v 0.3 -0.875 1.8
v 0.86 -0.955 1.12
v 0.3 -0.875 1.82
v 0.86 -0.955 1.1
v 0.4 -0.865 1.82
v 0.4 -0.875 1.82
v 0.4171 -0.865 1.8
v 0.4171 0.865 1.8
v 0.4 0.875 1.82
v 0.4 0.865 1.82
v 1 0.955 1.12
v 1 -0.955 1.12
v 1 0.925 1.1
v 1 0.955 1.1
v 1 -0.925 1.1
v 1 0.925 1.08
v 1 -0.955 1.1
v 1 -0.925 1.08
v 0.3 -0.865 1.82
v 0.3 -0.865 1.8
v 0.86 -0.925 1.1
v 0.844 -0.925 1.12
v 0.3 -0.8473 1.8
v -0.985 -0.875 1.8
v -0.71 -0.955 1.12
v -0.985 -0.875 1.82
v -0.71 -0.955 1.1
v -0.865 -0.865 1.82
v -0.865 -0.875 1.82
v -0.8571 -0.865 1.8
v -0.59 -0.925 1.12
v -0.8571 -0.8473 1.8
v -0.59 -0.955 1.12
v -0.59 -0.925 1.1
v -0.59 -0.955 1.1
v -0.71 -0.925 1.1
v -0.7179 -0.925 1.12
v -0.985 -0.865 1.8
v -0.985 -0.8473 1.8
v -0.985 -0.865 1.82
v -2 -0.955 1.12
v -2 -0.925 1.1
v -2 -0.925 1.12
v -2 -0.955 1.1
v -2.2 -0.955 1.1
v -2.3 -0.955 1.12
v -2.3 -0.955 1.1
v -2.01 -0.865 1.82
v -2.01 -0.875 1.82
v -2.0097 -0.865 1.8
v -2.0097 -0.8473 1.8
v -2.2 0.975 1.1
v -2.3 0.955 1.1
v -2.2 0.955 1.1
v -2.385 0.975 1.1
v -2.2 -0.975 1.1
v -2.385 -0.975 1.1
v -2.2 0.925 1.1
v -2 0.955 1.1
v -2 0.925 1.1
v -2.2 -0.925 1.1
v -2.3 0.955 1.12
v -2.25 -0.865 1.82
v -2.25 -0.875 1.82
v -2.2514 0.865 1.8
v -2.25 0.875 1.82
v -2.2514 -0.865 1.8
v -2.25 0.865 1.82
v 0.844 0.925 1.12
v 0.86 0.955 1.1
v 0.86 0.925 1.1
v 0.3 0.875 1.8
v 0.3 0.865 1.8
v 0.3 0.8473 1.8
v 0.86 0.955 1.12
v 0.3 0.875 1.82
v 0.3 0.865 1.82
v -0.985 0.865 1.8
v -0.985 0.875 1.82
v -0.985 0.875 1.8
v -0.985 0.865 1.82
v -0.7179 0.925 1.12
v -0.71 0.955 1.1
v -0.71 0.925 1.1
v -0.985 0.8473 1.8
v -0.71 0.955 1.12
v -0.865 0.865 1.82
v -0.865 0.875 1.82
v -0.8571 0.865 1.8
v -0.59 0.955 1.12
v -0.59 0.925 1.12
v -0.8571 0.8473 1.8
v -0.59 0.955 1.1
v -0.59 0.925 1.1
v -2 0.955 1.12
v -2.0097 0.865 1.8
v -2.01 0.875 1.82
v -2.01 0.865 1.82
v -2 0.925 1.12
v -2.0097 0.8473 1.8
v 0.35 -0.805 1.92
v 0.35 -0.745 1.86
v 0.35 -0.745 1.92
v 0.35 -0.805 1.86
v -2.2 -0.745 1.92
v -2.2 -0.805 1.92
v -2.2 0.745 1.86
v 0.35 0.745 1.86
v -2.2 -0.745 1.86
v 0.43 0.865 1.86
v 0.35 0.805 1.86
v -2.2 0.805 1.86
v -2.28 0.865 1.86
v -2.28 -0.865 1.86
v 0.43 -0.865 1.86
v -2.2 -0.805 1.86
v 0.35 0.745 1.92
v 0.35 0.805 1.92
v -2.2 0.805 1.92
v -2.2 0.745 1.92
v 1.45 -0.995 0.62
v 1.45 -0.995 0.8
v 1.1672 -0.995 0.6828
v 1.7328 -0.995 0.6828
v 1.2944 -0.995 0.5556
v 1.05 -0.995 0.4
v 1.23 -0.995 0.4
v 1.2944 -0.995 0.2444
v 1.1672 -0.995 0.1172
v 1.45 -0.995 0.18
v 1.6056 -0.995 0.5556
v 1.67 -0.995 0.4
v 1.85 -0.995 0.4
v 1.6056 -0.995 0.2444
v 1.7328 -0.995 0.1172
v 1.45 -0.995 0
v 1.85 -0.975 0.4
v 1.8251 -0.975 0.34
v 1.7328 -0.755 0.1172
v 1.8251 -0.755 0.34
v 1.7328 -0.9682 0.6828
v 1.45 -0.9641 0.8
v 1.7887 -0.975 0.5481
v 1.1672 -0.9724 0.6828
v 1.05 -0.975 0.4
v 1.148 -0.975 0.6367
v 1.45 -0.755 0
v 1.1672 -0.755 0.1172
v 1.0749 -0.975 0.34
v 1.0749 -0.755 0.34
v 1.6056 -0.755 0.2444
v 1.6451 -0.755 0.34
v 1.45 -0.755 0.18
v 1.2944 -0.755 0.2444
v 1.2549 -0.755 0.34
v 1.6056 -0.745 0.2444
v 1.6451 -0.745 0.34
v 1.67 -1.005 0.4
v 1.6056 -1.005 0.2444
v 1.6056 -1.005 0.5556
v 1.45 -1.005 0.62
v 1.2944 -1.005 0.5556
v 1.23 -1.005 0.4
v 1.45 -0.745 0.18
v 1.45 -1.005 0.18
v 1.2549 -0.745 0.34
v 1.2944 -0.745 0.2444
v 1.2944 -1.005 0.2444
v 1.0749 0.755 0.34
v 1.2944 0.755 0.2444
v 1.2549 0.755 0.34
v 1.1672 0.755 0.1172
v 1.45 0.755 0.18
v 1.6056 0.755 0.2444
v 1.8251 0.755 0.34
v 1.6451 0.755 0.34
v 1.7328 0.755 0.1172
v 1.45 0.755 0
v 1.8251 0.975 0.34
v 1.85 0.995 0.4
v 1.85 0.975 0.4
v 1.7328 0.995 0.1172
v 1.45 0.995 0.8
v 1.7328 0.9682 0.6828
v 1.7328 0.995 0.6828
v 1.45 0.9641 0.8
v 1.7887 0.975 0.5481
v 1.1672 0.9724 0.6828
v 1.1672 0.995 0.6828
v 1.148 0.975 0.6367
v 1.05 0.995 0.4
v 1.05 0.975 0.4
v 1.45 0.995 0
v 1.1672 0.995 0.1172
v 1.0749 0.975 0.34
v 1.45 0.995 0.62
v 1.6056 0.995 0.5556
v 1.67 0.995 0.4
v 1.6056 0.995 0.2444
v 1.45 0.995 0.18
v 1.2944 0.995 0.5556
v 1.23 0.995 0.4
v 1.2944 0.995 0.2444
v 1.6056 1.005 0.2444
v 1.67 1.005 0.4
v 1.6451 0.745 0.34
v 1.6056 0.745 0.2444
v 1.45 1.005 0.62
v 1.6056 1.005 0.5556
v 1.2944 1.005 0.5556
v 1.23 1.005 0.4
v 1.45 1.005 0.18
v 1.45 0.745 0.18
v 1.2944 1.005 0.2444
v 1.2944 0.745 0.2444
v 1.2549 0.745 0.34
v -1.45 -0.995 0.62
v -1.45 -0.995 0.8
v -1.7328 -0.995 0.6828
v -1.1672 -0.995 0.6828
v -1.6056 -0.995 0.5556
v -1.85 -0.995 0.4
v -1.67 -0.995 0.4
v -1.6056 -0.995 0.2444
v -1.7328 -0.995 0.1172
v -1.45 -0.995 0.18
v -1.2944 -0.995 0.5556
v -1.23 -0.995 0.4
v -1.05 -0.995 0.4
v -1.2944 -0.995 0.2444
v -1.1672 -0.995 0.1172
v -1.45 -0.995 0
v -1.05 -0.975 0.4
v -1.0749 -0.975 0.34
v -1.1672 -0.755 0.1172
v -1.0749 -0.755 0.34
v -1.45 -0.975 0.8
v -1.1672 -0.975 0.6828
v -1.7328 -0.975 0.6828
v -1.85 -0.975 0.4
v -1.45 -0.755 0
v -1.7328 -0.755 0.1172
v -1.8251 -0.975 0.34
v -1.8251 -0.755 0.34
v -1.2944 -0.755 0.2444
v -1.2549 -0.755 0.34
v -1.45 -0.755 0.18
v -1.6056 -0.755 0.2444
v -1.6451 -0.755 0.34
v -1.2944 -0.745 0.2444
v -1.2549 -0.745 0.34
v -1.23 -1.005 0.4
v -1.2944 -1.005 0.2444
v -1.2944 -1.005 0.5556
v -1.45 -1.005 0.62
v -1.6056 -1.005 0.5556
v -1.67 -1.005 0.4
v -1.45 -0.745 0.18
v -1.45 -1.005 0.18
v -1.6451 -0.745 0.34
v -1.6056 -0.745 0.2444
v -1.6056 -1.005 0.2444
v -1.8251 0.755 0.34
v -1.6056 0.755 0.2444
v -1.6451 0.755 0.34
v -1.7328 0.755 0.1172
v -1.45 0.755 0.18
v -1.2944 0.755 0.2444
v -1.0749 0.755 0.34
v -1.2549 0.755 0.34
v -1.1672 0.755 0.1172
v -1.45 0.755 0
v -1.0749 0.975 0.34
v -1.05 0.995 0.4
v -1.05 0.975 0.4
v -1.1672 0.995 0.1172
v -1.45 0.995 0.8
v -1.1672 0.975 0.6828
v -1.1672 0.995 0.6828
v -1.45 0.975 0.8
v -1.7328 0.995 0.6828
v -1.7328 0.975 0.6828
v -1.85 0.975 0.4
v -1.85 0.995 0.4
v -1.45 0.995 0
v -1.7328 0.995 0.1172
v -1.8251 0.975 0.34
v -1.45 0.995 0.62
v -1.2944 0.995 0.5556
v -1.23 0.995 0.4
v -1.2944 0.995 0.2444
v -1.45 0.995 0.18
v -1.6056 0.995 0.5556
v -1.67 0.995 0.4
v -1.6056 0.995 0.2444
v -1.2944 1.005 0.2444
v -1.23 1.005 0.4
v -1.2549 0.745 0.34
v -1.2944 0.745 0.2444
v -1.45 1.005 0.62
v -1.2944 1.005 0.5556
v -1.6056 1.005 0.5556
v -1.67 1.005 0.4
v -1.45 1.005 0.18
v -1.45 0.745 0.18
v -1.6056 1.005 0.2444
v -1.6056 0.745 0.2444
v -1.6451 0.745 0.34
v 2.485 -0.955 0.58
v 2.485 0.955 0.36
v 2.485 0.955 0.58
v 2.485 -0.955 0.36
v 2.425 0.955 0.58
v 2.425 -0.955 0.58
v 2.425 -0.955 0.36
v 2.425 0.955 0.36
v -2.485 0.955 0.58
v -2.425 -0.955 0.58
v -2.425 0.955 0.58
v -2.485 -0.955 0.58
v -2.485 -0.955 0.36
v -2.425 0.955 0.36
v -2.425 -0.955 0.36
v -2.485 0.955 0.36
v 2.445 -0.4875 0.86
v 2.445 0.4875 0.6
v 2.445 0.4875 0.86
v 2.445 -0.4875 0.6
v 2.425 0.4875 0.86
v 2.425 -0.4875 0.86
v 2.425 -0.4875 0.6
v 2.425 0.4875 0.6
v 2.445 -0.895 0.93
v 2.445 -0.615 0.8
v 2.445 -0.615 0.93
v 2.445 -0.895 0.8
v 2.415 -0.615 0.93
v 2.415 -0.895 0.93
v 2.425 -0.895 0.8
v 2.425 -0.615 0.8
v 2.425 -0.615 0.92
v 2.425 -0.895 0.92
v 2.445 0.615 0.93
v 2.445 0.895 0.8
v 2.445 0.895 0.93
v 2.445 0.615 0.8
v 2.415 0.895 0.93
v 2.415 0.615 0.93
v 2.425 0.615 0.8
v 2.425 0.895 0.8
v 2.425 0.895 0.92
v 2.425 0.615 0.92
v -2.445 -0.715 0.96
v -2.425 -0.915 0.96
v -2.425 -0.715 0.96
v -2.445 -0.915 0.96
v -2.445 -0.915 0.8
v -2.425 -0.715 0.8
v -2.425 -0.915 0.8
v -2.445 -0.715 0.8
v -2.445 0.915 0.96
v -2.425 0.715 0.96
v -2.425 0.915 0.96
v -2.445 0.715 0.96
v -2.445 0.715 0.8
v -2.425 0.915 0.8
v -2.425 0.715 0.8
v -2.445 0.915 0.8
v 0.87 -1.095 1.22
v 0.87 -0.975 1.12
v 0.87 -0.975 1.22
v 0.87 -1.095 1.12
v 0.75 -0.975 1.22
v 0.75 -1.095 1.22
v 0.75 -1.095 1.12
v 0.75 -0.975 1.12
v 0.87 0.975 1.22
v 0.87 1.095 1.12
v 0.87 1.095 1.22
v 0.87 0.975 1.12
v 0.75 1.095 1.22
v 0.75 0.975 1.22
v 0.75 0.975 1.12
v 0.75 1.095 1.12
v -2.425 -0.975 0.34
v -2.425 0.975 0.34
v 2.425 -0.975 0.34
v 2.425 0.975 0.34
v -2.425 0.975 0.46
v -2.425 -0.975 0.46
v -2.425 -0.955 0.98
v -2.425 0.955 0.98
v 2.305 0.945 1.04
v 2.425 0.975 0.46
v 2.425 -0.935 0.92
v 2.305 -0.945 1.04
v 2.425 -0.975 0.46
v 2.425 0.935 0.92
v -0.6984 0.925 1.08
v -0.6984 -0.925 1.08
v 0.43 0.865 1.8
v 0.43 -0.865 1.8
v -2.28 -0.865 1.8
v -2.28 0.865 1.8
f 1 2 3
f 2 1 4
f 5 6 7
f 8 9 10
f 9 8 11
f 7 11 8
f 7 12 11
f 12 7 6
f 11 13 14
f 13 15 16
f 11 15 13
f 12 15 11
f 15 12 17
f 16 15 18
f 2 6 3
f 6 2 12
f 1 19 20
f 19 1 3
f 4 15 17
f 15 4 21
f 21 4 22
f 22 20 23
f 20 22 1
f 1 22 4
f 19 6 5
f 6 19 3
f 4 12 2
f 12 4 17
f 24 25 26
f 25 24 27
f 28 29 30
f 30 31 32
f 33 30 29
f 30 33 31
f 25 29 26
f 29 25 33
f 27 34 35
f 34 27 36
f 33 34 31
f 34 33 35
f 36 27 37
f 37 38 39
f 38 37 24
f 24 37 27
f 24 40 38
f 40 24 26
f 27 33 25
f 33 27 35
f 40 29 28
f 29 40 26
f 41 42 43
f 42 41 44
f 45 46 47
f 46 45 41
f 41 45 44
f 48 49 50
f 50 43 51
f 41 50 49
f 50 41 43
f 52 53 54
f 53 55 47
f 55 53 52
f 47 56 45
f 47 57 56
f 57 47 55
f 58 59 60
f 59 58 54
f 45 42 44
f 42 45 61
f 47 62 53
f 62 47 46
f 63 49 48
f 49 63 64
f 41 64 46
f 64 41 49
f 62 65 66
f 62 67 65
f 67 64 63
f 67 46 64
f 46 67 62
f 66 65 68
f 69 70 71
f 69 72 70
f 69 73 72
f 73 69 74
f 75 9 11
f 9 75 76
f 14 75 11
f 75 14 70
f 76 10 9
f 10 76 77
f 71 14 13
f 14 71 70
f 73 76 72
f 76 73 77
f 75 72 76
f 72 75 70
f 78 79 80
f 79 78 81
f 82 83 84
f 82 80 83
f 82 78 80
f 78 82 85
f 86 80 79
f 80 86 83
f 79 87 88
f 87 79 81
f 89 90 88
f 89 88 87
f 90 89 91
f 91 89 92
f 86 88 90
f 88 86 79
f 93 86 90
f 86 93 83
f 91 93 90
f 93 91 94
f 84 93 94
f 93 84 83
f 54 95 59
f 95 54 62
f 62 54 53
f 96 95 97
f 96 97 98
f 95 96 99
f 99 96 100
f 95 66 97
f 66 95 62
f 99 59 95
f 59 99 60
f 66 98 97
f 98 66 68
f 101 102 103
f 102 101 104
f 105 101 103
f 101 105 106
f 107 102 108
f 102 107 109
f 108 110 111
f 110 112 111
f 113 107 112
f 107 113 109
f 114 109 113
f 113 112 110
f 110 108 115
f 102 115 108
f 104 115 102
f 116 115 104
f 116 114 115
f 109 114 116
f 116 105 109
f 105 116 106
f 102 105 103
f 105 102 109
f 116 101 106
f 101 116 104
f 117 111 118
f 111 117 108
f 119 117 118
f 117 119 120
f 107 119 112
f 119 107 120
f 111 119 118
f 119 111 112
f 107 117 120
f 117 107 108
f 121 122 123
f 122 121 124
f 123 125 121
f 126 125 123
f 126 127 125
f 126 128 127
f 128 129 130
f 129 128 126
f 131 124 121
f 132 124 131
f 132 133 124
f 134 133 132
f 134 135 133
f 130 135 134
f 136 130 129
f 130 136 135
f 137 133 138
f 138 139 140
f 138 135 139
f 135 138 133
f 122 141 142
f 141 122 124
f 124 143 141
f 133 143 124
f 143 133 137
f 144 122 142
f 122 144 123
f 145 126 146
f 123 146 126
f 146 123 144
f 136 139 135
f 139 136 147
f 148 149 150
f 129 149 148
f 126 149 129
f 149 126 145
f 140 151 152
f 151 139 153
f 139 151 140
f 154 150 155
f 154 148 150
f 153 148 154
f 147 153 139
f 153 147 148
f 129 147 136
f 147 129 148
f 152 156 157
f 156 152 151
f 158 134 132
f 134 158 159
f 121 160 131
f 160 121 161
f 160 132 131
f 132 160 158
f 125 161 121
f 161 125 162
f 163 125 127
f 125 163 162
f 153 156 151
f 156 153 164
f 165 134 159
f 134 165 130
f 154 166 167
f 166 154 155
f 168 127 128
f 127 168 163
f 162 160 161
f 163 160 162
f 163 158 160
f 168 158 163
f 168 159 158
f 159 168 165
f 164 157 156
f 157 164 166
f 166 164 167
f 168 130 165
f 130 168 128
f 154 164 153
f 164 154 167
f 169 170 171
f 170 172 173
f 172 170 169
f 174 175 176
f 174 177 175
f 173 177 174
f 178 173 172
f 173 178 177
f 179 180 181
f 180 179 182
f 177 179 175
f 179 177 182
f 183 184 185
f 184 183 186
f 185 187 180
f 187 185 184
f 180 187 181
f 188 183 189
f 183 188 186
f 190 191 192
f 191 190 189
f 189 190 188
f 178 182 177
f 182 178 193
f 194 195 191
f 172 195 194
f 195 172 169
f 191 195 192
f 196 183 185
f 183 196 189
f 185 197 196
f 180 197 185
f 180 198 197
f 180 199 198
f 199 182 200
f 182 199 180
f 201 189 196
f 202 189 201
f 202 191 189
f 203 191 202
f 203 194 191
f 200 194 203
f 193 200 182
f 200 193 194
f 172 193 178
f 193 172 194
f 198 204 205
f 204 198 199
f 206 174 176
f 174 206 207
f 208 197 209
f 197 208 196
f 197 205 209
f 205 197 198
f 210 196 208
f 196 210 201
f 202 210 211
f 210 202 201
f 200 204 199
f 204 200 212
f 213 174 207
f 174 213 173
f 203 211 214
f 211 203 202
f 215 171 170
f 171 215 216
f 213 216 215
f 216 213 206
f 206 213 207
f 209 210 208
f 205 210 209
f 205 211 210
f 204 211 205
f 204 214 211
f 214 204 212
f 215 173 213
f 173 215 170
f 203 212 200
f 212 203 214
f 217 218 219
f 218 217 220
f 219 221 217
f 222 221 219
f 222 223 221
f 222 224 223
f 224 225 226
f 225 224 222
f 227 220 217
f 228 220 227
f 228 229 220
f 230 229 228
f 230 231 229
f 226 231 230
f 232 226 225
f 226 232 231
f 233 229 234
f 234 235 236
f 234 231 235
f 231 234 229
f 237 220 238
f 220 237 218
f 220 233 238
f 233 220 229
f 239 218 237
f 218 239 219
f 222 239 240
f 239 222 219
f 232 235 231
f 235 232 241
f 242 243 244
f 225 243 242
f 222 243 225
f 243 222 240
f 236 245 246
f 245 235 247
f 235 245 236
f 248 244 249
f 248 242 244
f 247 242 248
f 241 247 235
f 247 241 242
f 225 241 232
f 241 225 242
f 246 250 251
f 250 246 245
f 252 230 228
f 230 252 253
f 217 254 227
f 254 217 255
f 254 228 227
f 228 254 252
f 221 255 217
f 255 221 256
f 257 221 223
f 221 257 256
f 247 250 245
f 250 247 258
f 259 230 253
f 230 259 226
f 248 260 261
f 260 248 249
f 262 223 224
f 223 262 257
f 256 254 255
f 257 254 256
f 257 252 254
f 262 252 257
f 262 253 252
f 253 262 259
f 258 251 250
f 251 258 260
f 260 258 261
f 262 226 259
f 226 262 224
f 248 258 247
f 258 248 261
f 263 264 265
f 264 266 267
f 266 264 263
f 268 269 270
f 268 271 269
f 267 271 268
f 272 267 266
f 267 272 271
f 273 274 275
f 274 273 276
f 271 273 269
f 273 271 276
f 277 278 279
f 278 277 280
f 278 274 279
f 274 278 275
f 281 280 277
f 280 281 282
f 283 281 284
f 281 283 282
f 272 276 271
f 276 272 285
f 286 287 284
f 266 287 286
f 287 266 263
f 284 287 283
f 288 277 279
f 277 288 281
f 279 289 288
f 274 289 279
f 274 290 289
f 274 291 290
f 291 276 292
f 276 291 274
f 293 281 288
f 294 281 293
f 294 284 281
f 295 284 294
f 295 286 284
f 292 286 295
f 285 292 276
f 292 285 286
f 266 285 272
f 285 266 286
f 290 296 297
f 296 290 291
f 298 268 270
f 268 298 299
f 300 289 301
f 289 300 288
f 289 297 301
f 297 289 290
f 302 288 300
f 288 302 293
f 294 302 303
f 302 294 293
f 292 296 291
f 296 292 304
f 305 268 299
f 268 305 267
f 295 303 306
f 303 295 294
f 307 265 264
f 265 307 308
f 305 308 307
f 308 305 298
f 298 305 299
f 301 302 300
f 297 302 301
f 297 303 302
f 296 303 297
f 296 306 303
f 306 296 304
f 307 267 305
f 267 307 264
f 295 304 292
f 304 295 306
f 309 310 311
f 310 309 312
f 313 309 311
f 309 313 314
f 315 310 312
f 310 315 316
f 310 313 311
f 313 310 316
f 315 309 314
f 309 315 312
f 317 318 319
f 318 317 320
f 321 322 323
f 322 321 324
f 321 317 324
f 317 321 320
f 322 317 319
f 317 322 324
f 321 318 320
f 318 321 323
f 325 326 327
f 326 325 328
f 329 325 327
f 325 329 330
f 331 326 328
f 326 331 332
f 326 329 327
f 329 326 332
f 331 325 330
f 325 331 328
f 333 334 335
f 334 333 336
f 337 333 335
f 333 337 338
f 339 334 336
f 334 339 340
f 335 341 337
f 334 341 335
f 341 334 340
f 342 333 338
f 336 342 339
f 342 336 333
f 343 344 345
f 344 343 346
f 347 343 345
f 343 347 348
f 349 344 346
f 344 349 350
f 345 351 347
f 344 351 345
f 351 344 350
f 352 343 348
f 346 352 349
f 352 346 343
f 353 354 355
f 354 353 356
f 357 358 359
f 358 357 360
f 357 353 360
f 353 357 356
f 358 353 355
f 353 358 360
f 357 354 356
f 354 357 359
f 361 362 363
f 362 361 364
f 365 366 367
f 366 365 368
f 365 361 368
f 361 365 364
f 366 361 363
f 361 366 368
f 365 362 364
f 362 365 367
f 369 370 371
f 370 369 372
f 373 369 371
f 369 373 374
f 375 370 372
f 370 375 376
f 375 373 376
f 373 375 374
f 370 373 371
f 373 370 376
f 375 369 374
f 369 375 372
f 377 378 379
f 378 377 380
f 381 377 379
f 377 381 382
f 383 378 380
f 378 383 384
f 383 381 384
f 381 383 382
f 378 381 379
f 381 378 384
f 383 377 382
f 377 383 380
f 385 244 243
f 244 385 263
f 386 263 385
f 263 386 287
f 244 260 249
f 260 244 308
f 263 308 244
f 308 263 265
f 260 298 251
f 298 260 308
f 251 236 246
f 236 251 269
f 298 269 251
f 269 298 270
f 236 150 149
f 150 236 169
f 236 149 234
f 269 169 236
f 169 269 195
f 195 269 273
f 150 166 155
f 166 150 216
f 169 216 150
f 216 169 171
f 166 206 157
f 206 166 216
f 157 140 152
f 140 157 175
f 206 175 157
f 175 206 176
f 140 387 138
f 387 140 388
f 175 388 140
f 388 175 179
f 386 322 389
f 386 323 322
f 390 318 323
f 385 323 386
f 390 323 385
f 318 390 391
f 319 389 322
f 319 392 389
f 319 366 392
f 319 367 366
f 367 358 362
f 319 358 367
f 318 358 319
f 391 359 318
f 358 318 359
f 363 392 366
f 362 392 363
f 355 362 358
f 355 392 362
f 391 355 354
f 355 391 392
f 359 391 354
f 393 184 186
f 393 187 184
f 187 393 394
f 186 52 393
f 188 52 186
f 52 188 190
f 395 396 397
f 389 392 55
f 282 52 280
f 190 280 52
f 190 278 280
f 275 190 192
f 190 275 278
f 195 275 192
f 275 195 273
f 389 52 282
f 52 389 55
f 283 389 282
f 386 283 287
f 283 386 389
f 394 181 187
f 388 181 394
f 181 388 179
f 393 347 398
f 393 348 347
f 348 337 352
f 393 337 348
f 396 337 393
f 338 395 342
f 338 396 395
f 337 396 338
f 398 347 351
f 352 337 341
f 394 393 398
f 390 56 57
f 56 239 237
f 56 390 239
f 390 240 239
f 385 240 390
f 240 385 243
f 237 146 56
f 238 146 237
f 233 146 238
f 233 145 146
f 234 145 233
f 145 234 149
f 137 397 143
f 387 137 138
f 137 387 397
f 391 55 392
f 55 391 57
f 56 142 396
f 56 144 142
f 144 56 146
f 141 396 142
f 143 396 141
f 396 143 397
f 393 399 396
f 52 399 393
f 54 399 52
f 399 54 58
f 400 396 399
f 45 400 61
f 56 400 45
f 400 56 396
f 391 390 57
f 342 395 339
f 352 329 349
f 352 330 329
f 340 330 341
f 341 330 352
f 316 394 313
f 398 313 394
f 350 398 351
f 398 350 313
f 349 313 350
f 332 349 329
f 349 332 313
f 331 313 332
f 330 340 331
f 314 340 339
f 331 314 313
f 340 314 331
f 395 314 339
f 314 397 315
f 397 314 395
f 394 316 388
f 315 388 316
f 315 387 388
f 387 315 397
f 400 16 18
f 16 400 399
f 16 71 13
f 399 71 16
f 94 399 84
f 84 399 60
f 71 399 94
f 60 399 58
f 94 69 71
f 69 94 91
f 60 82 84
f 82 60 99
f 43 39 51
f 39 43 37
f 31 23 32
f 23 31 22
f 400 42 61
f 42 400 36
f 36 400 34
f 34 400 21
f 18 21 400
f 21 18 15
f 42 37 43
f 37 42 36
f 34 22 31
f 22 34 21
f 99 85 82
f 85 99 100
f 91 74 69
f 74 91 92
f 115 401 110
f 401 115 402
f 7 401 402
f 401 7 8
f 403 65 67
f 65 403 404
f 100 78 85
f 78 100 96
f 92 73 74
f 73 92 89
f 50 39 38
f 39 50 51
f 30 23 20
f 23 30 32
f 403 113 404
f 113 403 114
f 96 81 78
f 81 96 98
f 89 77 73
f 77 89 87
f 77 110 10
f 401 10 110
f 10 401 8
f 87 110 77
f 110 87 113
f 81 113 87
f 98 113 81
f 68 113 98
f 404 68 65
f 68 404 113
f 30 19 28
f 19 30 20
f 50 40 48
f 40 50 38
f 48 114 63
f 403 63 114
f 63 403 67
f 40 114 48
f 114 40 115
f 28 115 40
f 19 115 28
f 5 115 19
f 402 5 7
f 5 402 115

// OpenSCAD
// file: lib/car_kit.scad
// Car kit — the parts every road vehicle shares (car_sedan.scad,
// car_minisuv.scad, car_suv.scad, car_jeep.scad, car_van.scad), which
// differ in their proportions. world.CarKind names them; the renderer
// draws each kind from its own mesh, tinted per car, with a roof rack or
// box (car_roof_rack.scad, car_roof_box.scad) set on the roof at the
// height in render.carRoofs.
//
//   +X = forward (the car's front faces +X)
//   +Y = lateral (driver's left when facing +X)
//   +Z = up
//
// The paint is near white so the per-car tint is the paint colour;
// glass, tyres, trim and lights are dark or bright enough to read
// through any tint.
//
// Conventions, units, and axis docs: see models-src/README.md.

$fn = 8;

paint  = [0.92, 0.92, 0.92];
glass  = [0.30, 0.40, 0.50];
trim   = [0.16, 0.16, 0.17]; // bumpers, grille, rails, mirrors
tyre   = [0.08, 0.08, 0.08];
hubcap = [0.55, 0.56, 0.58];
lamp   = [1.00, 0.96, 0.82];
tail   = [0.80, 0.12, 0.10];

// slab is a thin box from x0 to x1, centred in Y, its top at z.
module slab(x0, x1, w, z, t = 0.04) {
    translate([x0, -w / 2, z - t]) cube([x1 - x0, w, t]);
}

module wheel(x, y, r, t) {
    translate([x, y, r]) rotate([90, 0, 0]) {
        color(tyre) cylinder(h = t, r = r, center = true);
        color(hubcap) cylinder(h = t + 0.02, r = r * 0.55, center = true);
    }
}

// vehicle draws one car.
//   len, w        overall body length and width
//   r, wb         wheel radius and wheelbase (axles centred on x = axle_x)
//   sill          height of the body's underside
//   belt          the beltline: top of the doors, bottom of the glass
//   hood          top of the hood at the nose (below belt slopes it)
//   nose, tailin  how far the top of the body is drawn in from the
//                 front and back ends (rounding them)
//   roof          roof height
//   gb            [x0, x1] the glass at the beltline
//   gr            [x0, x1] the glass at the roof
//   rails         roof rails (SUVs)
module vehicle(len, w, r, wb, sill, belt, hood, nose, tailin, roof, gb, gr,
               axle_x = 0, rails = false) {
    // Body: a hull from the full-length underside to the beltline at the
    // back and the hood at the nose.
    color(paint) hull() {
        slab(-len / 2, len / 2, w, sill + 0.12, 0.12);
        slab(-len / 2 + tailin, gb[0] + 0.1, w, belt);
        slab(gb[1] - 0.1, len / 2 - nose, w - 0.06, hood);
        slab(-len / 2, -len / 2 + 0.05, w - 0.04, belt - 0.12);
        slab(len / 2 - 0.05, len / 2, w - 0.08, hood - 0.12);
    }
    // Glass greenhouse, and the painted roof on it.
    color(glass) hull() {
        slab(gb[0], gb[1], w - 0.10, belt + 0.02, 0.04);
        slab(gr[0], gr[1], w - 0.26, roof - 0.04, 0.04);
    }
    color(paint) slab(gr[0] - 0.03, gr[1] + 0.03, w - 0.22, roof, 0.06);
    // Pillars down the sides of the glass: the windshield's (A), between
    // the doors (B), and a broad one at the back (C).
    color(paint) for (s = [-1, 1]) {
        pillar(gb[1] - 0.14, gb[1], gr[1] - 0.10, gr[1], s);
        pillar((gb[0] + gb[1]) / 2 - 0.06, (gb[0] + gb[1]) / 2 + 0.06,
               (gr[0] + gr[1]) / 2 - 0.06, (gr[0] + gr[1]) / 2 + 0.06, s);
        pillar(gb[0], gb[0] + 0.30, gr[0], gr[0] + 0.24, s);
    }
    module pillar(b0, b1, r0, r1, s) hull() {
        translate([b0, s * (w - 0.10) / 2 - 0.03, belt]) cube([b1 - b0, 0.06, 0.02]);
        translate([r0, s * (w - 0.26) / 2 - 0.03, roof - 0.06]) cube([r1 - r0, 0.06, 0.02]);
    }
    if (rails)
        color(trim) for (s = [-1, 1])
            translate([gr[0] + 0.05, s * (w / 2 - 0.2) - 0.03, roof])
                cube([gr[1] - gr[0] - 0.1, 0.06, 0.06]);

    // Wheels, flush with the body sides.
    t = 0.24;
    for (x = [axle_x + wb / 2, axle_x - wb / 2], s = [-1, 1])
        wheel(x, s * (w / 2 - t / 2 + 0.02), r, t);

    // Bumpers, grille, lights.
    bz = sill + 0.02;
    color(trim) {
        translate([len / 2 - 0.08, -w / 2 + 0.02, bz]) cube([0.14, w - 0.04, 0.22]);
        translate([-len / 2 - 0.06, -w / 2 + 0.02, bz]) cube([0.14, w - 0.04, 0.22]);
        translate([len / 2 - 0.03, -w * 0.25, bz + 0.24]) cube([0.05, w * 0.5, max(hood - bz - 0.42, 0.12)]);
    }
    lz = hood - 0.16;
    color(lamp) for (s = [-1, 1])
        translate([len / 2 - 0.04, s * (w / 2 - 0.22) - 0.14, lz - 0.08]) cube([0.06, 0.28, 0.13]);
    color(tail) for (s = [-1, 1])
        translate([-len / 2 - 0.02, s * (w / 2 - 0.16) - 0.10, belt - 0.30]) cube([0.06, 0.20, 0.16]);
    // Mirrors.
    color(trim) for (s = [-1, 1])
        translate([gb[1] - 0.25, s * (w / 2 + 0.06) - 0.06, belt + 0.02]) cube([0.12, 0.12, 0.10]);

    echo("MOGUL_META", "footprint", len / 2, w / 2 + 0.08);
}
// main file
// SUV — a full-size sport utility: long and square, high roof with
// rails, big wheels. Seats four (the demand model fills it like a car).
// Parts and conventions: lib/car_kit.scad.
include <lib/car_kit.scad>

vehicle(len = 4.85, w = 1.95, r = 0.40, wb = 2.90, sill = 0.34,
        belt = 1.10, hood = 1.04, nose = 0.12, tailin = 0.04,
        roof = 1.86, gb = [-2.30, 1.00], gr = [-2.25, 0.40], rails = true);
